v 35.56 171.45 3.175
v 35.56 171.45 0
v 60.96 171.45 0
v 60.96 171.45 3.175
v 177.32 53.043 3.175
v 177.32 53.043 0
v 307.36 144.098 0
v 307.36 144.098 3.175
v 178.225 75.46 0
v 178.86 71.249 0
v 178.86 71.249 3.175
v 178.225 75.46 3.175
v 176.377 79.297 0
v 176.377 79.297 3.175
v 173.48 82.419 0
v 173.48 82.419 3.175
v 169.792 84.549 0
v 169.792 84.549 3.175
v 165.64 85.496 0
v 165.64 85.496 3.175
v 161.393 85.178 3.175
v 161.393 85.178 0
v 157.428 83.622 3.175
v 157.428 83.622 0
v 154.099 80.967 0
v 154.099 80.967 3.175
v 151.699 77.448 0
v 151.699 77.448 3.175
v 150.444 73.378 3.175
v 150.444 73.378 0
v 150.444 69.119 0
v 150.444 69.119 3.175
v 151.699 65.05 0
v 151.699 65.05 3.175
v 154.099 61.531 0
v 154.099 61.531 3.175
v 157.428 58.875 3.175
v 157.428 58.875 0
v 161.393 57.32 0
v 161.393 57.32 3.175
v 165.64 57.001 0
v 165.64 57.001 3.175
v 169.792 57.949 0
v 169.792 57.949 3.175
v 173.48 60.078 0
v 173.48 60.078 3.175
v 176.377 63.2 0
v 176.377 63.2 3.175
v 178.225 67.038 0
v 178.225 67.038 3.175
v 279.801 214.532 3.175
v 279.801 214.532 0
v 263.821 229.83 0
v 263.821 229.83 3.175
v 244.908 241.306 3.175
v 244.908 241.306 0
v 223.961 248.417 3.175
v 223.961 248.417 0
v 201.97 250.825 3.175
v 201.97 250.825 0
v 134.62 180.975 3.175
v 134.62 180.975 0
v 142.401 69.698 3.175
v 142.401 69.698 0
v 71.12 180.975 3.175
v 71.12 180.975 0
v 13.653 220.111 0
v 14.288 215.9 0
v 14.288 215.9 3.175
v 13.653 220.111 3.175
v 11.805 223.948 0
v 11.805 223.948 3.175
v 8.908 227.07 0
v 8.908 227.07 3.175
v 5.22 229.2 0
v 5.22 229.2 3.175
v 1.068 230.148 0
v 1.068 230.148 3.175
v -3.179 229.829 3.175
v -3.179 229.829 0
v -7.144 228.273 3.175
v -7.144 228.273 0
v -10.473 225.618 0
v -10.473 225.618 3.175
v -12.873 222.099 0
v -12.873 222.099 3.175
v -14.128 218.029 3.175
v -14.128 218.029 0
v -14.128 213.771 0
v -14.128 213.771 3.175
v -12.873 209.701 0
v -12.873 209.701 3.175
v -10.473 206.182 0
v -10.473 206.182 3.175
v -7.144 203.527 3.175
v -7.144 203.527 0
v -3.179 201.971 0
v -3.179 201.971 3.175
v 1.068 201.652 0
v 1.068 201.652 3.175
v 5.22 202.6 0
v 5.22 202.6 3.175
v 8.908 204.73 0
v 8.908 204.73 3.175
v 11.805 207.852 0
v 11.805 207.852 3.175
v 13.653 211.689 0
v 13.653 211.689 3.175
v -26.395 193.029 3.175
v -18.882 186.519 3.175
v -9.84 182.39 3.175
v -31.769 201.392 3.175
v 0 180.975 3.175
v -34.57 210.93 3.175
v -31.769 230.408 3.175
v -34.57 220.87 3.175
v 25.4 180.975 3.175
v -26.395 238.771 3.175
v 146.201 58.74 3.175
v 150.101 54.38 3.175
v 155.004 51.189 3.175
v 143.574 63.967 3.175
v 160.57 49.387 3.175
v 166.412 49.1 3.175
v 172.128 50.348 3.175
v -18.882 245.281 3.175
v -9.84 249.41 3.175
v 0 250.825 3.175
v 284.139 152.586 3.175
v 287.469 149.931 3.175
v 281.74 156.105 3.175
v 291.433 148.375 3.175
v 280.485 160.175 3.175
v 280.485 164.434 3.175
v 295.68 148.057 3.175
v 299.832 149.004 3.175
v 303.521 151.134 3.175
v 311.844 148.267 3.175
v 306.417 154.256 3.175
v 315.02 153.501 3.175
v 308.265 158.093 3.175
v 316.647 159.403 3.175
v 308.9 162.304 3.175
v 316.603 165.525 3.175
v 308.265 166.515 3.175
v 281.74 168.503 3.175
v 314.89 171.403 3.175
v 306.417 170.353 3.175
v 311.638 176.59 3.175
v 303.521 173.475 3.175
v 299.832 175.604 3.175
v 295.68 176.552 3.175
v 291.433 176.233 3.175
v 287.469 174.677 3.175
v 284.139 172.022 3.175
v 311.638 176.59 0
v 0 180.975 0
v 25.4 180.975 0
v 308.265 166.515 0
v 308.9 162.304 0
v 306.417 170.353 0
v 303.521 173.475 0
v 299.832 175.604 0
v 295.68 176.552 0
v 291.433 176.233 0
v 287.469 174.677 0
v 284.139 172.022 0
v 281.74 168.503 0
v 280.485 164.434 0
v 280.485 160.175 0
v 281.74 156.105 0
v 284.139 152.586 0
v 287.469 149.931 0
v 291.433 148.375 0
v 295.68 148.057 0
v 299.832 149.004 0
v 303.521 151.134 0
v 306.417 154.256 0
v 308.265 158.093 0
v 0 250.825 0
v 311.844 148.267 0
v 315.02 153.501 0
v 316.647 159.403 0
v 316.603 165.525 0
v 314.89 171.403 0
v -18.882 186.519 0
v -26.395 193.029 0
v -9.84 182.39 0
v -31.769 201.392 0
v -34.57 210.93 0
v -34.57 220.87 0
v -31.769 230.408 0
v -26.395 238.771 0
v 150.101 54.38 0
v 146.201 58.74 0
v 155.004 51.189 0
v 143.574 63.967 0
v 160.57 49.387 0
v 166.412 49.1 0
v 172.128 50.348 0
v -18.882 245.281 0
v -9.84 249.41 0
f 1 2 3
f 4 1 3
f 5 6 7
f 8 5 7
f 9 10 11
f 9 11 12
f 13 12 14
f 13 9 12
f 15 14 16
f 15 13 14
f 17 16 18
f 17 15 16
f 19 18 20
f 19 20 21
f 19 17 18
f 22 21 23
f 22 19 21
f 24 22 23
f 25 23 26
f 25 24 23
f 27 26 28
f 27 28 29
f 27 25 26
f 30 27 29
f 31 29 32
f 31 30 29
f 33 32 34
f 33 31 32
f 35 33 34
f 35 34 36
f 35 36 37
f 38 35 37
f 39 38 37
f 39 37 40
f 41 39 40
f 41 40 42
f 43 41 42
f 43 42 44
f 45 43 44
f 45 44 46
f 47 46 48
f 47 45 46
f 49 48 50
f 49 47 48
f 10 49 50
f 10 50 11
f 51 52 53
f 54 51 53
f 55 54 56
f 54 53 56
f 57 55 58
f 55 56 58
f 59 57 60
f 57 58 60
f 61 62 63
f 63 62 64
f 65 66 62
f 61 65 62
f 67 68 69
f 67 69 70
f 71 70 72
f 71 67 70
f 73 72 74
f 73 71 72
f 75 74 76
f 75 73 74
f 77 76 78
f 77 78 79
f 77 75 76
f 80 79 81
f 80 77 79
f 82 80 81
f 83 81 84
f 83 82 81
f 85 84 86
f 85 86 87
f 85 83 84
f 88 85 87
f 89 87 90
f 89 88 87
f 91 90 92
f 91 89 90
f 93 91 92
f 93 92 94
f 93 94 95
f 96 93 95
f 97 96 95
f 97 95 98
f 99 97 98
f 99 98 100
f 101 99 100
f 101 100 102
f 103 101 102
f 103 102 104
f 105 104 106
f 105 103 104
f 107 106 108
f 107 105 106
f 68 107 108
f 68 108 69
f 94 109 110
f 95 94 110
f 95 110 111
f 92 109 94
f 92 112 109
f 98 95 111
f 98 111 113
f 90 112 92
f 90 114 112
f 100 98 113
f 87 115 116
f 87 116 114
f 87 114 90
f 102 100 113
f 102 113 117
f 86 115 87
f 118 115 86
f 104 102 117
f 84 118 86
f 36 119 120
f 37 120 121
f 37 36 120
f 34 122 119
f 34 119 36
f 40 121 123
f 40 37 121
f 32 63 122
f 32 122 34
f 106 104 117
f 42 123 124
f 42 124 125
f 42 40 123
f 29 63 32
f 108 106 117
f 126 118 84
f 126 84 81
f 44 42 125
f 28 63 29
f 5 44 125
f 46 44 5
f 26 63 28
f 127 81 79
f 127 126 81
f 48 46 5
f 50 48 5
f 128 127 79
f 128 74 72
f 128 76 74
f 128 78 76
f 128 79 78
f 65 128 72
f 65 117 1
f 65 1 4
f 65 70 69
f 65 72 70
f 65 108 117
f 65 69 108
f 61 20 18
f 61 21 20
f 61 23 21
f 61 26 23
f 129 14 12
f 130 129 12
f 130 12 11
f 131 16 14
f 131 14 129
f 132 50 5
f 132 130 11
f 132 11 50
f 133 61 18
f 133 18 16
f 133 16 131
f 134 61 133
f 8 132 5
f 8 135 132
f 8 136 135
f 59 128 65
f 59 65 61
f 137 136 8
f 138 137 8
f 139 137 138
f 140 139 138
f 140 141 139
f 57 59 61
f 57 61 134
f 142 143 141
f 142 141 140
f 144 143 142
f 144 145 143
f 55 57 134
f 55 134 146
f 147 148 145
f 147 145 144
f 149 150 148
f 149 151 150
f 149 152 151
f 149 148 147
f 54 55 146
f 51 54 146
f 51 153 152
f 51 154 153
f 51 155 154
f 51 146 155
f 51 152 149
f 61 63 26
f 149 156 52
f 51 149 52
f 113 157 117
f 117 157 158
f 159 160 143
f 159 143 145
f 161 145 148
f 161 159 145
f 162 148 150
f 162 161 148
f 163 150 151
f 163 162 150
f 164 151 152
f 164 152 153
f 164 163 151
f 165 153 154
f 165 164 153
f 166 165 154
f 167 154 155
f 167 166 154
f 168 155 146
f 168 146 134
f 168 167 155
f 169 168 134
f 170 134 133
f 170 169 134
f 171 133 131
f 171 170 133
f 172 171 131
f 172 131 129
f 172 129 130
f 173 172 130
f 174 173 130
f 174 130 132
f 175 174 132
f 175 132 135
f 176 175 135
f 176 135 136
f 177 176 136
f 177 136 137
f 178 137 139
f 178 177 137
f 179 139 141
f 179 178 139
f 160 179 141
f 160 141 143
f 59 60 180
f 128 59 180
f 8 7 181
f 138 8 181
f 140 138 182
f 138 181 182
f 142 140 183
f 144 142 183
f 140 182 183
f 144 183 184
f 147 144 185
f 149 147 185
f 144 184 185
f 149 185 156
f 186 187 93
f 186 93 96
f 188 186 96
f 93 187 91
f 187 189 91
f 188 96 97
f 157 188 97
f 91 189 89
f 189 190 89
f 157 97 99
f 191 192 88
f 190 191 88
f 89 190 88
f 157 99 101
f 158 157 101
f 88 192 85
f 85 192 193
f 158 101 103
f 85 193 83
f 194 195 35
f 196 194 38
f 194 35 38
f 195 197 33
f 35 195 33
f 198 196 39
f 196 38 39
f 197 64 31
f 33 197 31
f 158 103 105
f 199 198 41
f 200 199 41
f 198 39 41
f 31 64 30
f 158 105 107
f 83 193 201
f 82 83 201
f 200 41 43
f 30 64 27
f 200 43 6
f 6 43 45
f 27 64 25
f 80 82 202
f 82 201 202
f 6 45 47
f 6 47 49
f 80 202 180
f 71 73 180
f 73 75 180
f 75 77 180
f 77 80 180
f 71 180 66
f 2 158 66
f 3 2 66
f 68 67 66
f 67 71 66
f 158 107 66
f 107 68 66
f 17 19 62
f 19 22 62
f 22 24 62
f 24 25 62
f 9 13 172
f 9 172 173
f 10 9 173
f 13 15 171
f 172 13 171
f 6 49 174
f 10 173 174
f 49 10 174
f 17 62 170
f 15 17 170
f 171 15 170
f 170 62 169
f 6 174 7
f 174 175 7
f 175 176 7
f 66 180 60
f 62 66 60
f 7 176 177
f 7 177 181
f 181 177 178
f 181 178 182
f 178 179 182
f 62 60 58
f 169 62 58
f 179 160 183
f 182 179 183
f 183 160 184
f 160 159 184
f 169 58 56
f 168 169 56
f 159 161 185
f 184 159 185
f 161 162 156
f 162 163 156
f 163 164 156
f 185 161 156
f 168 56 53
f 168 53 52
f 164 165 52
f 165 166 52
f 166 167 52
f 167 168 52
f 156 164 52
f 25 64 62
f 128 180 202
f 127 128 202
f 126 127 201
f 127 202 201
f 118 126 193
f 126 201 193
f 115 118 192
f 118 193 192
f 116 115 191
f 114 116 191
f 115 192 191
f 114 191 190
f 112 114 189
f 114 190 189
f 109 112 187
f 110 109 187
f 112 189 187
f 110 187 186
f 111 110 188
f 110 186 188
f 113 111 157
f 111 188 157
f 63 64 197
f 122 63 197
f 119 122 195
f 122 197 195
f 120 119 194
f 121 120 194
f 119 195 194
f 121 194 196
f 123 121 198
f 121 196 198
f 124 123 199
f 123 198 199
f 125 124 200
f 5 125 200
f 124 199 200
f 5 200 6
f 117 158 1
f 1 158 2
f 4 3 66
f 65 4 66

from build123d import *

# Parameters (mm, degrees)
SKETCH1_R           = 14.2875
BOSS_EXTRUDE1_DEPTH = 3.175


with BuildPart() as part:
    # Sketch1 → Boss-Extrude1 (new body)
    with BuildSketch(Plane.XY):
        with BuildLine():
            Line((134.62, 180.975), (142.401211704, 69.698488351))
            ThreePointArc((142.401211704, 69.698488351), (155.003963594, 51.188868036), (177.319809019, 53.043171796))
            Line((177.319809019, 53.043171796), (307.36019605, 144.098431067))
            ThreePointArc((307.36019605, 144.098431067), (316.647321796, 159.403140629), (311.6377975, 176.590039876))
            Line((311.6377975, 176.590039876), (279.800527192, 214.532221144))
            ThreePointArc((279.800527192, 214.532221144), (244.908427164, 241.305871163), (201.970411771, 250.825))
            Line((201.970411771, 250.825), (0, 250.825))
            ThreePointArc((0, 250.825), (-34.925, 215.9), (0, 180.975))
            Line((0, 180.975), (25.4, 180.975))
            Line((25.4, 180.975), (35.56, 171.45))
            Line((35.56, 171.45), (60.96, 171.45))
            Line((60.96, 171.45), (71.12, 180.975))
            Line((71.12, 180.975), (134.62, 180.975))
        make_face()
        with Locations((294.612459752, 162.304085251)):
            Circle(SKETCH1_R, mode=Mode.SUBTRACT)
        with Locations((164.572072721, 71.24882598)):
            Circle(SKETCH1_R, mode=Mode.SUBTRACT)
        with Locations((0, 215.9)):
            Circle(SKETCH1_R, mode=Mode.SUBTRACT)
    extrude(amount=BOSS_EXTRUDE1_DEPTH)


solid = part.part
